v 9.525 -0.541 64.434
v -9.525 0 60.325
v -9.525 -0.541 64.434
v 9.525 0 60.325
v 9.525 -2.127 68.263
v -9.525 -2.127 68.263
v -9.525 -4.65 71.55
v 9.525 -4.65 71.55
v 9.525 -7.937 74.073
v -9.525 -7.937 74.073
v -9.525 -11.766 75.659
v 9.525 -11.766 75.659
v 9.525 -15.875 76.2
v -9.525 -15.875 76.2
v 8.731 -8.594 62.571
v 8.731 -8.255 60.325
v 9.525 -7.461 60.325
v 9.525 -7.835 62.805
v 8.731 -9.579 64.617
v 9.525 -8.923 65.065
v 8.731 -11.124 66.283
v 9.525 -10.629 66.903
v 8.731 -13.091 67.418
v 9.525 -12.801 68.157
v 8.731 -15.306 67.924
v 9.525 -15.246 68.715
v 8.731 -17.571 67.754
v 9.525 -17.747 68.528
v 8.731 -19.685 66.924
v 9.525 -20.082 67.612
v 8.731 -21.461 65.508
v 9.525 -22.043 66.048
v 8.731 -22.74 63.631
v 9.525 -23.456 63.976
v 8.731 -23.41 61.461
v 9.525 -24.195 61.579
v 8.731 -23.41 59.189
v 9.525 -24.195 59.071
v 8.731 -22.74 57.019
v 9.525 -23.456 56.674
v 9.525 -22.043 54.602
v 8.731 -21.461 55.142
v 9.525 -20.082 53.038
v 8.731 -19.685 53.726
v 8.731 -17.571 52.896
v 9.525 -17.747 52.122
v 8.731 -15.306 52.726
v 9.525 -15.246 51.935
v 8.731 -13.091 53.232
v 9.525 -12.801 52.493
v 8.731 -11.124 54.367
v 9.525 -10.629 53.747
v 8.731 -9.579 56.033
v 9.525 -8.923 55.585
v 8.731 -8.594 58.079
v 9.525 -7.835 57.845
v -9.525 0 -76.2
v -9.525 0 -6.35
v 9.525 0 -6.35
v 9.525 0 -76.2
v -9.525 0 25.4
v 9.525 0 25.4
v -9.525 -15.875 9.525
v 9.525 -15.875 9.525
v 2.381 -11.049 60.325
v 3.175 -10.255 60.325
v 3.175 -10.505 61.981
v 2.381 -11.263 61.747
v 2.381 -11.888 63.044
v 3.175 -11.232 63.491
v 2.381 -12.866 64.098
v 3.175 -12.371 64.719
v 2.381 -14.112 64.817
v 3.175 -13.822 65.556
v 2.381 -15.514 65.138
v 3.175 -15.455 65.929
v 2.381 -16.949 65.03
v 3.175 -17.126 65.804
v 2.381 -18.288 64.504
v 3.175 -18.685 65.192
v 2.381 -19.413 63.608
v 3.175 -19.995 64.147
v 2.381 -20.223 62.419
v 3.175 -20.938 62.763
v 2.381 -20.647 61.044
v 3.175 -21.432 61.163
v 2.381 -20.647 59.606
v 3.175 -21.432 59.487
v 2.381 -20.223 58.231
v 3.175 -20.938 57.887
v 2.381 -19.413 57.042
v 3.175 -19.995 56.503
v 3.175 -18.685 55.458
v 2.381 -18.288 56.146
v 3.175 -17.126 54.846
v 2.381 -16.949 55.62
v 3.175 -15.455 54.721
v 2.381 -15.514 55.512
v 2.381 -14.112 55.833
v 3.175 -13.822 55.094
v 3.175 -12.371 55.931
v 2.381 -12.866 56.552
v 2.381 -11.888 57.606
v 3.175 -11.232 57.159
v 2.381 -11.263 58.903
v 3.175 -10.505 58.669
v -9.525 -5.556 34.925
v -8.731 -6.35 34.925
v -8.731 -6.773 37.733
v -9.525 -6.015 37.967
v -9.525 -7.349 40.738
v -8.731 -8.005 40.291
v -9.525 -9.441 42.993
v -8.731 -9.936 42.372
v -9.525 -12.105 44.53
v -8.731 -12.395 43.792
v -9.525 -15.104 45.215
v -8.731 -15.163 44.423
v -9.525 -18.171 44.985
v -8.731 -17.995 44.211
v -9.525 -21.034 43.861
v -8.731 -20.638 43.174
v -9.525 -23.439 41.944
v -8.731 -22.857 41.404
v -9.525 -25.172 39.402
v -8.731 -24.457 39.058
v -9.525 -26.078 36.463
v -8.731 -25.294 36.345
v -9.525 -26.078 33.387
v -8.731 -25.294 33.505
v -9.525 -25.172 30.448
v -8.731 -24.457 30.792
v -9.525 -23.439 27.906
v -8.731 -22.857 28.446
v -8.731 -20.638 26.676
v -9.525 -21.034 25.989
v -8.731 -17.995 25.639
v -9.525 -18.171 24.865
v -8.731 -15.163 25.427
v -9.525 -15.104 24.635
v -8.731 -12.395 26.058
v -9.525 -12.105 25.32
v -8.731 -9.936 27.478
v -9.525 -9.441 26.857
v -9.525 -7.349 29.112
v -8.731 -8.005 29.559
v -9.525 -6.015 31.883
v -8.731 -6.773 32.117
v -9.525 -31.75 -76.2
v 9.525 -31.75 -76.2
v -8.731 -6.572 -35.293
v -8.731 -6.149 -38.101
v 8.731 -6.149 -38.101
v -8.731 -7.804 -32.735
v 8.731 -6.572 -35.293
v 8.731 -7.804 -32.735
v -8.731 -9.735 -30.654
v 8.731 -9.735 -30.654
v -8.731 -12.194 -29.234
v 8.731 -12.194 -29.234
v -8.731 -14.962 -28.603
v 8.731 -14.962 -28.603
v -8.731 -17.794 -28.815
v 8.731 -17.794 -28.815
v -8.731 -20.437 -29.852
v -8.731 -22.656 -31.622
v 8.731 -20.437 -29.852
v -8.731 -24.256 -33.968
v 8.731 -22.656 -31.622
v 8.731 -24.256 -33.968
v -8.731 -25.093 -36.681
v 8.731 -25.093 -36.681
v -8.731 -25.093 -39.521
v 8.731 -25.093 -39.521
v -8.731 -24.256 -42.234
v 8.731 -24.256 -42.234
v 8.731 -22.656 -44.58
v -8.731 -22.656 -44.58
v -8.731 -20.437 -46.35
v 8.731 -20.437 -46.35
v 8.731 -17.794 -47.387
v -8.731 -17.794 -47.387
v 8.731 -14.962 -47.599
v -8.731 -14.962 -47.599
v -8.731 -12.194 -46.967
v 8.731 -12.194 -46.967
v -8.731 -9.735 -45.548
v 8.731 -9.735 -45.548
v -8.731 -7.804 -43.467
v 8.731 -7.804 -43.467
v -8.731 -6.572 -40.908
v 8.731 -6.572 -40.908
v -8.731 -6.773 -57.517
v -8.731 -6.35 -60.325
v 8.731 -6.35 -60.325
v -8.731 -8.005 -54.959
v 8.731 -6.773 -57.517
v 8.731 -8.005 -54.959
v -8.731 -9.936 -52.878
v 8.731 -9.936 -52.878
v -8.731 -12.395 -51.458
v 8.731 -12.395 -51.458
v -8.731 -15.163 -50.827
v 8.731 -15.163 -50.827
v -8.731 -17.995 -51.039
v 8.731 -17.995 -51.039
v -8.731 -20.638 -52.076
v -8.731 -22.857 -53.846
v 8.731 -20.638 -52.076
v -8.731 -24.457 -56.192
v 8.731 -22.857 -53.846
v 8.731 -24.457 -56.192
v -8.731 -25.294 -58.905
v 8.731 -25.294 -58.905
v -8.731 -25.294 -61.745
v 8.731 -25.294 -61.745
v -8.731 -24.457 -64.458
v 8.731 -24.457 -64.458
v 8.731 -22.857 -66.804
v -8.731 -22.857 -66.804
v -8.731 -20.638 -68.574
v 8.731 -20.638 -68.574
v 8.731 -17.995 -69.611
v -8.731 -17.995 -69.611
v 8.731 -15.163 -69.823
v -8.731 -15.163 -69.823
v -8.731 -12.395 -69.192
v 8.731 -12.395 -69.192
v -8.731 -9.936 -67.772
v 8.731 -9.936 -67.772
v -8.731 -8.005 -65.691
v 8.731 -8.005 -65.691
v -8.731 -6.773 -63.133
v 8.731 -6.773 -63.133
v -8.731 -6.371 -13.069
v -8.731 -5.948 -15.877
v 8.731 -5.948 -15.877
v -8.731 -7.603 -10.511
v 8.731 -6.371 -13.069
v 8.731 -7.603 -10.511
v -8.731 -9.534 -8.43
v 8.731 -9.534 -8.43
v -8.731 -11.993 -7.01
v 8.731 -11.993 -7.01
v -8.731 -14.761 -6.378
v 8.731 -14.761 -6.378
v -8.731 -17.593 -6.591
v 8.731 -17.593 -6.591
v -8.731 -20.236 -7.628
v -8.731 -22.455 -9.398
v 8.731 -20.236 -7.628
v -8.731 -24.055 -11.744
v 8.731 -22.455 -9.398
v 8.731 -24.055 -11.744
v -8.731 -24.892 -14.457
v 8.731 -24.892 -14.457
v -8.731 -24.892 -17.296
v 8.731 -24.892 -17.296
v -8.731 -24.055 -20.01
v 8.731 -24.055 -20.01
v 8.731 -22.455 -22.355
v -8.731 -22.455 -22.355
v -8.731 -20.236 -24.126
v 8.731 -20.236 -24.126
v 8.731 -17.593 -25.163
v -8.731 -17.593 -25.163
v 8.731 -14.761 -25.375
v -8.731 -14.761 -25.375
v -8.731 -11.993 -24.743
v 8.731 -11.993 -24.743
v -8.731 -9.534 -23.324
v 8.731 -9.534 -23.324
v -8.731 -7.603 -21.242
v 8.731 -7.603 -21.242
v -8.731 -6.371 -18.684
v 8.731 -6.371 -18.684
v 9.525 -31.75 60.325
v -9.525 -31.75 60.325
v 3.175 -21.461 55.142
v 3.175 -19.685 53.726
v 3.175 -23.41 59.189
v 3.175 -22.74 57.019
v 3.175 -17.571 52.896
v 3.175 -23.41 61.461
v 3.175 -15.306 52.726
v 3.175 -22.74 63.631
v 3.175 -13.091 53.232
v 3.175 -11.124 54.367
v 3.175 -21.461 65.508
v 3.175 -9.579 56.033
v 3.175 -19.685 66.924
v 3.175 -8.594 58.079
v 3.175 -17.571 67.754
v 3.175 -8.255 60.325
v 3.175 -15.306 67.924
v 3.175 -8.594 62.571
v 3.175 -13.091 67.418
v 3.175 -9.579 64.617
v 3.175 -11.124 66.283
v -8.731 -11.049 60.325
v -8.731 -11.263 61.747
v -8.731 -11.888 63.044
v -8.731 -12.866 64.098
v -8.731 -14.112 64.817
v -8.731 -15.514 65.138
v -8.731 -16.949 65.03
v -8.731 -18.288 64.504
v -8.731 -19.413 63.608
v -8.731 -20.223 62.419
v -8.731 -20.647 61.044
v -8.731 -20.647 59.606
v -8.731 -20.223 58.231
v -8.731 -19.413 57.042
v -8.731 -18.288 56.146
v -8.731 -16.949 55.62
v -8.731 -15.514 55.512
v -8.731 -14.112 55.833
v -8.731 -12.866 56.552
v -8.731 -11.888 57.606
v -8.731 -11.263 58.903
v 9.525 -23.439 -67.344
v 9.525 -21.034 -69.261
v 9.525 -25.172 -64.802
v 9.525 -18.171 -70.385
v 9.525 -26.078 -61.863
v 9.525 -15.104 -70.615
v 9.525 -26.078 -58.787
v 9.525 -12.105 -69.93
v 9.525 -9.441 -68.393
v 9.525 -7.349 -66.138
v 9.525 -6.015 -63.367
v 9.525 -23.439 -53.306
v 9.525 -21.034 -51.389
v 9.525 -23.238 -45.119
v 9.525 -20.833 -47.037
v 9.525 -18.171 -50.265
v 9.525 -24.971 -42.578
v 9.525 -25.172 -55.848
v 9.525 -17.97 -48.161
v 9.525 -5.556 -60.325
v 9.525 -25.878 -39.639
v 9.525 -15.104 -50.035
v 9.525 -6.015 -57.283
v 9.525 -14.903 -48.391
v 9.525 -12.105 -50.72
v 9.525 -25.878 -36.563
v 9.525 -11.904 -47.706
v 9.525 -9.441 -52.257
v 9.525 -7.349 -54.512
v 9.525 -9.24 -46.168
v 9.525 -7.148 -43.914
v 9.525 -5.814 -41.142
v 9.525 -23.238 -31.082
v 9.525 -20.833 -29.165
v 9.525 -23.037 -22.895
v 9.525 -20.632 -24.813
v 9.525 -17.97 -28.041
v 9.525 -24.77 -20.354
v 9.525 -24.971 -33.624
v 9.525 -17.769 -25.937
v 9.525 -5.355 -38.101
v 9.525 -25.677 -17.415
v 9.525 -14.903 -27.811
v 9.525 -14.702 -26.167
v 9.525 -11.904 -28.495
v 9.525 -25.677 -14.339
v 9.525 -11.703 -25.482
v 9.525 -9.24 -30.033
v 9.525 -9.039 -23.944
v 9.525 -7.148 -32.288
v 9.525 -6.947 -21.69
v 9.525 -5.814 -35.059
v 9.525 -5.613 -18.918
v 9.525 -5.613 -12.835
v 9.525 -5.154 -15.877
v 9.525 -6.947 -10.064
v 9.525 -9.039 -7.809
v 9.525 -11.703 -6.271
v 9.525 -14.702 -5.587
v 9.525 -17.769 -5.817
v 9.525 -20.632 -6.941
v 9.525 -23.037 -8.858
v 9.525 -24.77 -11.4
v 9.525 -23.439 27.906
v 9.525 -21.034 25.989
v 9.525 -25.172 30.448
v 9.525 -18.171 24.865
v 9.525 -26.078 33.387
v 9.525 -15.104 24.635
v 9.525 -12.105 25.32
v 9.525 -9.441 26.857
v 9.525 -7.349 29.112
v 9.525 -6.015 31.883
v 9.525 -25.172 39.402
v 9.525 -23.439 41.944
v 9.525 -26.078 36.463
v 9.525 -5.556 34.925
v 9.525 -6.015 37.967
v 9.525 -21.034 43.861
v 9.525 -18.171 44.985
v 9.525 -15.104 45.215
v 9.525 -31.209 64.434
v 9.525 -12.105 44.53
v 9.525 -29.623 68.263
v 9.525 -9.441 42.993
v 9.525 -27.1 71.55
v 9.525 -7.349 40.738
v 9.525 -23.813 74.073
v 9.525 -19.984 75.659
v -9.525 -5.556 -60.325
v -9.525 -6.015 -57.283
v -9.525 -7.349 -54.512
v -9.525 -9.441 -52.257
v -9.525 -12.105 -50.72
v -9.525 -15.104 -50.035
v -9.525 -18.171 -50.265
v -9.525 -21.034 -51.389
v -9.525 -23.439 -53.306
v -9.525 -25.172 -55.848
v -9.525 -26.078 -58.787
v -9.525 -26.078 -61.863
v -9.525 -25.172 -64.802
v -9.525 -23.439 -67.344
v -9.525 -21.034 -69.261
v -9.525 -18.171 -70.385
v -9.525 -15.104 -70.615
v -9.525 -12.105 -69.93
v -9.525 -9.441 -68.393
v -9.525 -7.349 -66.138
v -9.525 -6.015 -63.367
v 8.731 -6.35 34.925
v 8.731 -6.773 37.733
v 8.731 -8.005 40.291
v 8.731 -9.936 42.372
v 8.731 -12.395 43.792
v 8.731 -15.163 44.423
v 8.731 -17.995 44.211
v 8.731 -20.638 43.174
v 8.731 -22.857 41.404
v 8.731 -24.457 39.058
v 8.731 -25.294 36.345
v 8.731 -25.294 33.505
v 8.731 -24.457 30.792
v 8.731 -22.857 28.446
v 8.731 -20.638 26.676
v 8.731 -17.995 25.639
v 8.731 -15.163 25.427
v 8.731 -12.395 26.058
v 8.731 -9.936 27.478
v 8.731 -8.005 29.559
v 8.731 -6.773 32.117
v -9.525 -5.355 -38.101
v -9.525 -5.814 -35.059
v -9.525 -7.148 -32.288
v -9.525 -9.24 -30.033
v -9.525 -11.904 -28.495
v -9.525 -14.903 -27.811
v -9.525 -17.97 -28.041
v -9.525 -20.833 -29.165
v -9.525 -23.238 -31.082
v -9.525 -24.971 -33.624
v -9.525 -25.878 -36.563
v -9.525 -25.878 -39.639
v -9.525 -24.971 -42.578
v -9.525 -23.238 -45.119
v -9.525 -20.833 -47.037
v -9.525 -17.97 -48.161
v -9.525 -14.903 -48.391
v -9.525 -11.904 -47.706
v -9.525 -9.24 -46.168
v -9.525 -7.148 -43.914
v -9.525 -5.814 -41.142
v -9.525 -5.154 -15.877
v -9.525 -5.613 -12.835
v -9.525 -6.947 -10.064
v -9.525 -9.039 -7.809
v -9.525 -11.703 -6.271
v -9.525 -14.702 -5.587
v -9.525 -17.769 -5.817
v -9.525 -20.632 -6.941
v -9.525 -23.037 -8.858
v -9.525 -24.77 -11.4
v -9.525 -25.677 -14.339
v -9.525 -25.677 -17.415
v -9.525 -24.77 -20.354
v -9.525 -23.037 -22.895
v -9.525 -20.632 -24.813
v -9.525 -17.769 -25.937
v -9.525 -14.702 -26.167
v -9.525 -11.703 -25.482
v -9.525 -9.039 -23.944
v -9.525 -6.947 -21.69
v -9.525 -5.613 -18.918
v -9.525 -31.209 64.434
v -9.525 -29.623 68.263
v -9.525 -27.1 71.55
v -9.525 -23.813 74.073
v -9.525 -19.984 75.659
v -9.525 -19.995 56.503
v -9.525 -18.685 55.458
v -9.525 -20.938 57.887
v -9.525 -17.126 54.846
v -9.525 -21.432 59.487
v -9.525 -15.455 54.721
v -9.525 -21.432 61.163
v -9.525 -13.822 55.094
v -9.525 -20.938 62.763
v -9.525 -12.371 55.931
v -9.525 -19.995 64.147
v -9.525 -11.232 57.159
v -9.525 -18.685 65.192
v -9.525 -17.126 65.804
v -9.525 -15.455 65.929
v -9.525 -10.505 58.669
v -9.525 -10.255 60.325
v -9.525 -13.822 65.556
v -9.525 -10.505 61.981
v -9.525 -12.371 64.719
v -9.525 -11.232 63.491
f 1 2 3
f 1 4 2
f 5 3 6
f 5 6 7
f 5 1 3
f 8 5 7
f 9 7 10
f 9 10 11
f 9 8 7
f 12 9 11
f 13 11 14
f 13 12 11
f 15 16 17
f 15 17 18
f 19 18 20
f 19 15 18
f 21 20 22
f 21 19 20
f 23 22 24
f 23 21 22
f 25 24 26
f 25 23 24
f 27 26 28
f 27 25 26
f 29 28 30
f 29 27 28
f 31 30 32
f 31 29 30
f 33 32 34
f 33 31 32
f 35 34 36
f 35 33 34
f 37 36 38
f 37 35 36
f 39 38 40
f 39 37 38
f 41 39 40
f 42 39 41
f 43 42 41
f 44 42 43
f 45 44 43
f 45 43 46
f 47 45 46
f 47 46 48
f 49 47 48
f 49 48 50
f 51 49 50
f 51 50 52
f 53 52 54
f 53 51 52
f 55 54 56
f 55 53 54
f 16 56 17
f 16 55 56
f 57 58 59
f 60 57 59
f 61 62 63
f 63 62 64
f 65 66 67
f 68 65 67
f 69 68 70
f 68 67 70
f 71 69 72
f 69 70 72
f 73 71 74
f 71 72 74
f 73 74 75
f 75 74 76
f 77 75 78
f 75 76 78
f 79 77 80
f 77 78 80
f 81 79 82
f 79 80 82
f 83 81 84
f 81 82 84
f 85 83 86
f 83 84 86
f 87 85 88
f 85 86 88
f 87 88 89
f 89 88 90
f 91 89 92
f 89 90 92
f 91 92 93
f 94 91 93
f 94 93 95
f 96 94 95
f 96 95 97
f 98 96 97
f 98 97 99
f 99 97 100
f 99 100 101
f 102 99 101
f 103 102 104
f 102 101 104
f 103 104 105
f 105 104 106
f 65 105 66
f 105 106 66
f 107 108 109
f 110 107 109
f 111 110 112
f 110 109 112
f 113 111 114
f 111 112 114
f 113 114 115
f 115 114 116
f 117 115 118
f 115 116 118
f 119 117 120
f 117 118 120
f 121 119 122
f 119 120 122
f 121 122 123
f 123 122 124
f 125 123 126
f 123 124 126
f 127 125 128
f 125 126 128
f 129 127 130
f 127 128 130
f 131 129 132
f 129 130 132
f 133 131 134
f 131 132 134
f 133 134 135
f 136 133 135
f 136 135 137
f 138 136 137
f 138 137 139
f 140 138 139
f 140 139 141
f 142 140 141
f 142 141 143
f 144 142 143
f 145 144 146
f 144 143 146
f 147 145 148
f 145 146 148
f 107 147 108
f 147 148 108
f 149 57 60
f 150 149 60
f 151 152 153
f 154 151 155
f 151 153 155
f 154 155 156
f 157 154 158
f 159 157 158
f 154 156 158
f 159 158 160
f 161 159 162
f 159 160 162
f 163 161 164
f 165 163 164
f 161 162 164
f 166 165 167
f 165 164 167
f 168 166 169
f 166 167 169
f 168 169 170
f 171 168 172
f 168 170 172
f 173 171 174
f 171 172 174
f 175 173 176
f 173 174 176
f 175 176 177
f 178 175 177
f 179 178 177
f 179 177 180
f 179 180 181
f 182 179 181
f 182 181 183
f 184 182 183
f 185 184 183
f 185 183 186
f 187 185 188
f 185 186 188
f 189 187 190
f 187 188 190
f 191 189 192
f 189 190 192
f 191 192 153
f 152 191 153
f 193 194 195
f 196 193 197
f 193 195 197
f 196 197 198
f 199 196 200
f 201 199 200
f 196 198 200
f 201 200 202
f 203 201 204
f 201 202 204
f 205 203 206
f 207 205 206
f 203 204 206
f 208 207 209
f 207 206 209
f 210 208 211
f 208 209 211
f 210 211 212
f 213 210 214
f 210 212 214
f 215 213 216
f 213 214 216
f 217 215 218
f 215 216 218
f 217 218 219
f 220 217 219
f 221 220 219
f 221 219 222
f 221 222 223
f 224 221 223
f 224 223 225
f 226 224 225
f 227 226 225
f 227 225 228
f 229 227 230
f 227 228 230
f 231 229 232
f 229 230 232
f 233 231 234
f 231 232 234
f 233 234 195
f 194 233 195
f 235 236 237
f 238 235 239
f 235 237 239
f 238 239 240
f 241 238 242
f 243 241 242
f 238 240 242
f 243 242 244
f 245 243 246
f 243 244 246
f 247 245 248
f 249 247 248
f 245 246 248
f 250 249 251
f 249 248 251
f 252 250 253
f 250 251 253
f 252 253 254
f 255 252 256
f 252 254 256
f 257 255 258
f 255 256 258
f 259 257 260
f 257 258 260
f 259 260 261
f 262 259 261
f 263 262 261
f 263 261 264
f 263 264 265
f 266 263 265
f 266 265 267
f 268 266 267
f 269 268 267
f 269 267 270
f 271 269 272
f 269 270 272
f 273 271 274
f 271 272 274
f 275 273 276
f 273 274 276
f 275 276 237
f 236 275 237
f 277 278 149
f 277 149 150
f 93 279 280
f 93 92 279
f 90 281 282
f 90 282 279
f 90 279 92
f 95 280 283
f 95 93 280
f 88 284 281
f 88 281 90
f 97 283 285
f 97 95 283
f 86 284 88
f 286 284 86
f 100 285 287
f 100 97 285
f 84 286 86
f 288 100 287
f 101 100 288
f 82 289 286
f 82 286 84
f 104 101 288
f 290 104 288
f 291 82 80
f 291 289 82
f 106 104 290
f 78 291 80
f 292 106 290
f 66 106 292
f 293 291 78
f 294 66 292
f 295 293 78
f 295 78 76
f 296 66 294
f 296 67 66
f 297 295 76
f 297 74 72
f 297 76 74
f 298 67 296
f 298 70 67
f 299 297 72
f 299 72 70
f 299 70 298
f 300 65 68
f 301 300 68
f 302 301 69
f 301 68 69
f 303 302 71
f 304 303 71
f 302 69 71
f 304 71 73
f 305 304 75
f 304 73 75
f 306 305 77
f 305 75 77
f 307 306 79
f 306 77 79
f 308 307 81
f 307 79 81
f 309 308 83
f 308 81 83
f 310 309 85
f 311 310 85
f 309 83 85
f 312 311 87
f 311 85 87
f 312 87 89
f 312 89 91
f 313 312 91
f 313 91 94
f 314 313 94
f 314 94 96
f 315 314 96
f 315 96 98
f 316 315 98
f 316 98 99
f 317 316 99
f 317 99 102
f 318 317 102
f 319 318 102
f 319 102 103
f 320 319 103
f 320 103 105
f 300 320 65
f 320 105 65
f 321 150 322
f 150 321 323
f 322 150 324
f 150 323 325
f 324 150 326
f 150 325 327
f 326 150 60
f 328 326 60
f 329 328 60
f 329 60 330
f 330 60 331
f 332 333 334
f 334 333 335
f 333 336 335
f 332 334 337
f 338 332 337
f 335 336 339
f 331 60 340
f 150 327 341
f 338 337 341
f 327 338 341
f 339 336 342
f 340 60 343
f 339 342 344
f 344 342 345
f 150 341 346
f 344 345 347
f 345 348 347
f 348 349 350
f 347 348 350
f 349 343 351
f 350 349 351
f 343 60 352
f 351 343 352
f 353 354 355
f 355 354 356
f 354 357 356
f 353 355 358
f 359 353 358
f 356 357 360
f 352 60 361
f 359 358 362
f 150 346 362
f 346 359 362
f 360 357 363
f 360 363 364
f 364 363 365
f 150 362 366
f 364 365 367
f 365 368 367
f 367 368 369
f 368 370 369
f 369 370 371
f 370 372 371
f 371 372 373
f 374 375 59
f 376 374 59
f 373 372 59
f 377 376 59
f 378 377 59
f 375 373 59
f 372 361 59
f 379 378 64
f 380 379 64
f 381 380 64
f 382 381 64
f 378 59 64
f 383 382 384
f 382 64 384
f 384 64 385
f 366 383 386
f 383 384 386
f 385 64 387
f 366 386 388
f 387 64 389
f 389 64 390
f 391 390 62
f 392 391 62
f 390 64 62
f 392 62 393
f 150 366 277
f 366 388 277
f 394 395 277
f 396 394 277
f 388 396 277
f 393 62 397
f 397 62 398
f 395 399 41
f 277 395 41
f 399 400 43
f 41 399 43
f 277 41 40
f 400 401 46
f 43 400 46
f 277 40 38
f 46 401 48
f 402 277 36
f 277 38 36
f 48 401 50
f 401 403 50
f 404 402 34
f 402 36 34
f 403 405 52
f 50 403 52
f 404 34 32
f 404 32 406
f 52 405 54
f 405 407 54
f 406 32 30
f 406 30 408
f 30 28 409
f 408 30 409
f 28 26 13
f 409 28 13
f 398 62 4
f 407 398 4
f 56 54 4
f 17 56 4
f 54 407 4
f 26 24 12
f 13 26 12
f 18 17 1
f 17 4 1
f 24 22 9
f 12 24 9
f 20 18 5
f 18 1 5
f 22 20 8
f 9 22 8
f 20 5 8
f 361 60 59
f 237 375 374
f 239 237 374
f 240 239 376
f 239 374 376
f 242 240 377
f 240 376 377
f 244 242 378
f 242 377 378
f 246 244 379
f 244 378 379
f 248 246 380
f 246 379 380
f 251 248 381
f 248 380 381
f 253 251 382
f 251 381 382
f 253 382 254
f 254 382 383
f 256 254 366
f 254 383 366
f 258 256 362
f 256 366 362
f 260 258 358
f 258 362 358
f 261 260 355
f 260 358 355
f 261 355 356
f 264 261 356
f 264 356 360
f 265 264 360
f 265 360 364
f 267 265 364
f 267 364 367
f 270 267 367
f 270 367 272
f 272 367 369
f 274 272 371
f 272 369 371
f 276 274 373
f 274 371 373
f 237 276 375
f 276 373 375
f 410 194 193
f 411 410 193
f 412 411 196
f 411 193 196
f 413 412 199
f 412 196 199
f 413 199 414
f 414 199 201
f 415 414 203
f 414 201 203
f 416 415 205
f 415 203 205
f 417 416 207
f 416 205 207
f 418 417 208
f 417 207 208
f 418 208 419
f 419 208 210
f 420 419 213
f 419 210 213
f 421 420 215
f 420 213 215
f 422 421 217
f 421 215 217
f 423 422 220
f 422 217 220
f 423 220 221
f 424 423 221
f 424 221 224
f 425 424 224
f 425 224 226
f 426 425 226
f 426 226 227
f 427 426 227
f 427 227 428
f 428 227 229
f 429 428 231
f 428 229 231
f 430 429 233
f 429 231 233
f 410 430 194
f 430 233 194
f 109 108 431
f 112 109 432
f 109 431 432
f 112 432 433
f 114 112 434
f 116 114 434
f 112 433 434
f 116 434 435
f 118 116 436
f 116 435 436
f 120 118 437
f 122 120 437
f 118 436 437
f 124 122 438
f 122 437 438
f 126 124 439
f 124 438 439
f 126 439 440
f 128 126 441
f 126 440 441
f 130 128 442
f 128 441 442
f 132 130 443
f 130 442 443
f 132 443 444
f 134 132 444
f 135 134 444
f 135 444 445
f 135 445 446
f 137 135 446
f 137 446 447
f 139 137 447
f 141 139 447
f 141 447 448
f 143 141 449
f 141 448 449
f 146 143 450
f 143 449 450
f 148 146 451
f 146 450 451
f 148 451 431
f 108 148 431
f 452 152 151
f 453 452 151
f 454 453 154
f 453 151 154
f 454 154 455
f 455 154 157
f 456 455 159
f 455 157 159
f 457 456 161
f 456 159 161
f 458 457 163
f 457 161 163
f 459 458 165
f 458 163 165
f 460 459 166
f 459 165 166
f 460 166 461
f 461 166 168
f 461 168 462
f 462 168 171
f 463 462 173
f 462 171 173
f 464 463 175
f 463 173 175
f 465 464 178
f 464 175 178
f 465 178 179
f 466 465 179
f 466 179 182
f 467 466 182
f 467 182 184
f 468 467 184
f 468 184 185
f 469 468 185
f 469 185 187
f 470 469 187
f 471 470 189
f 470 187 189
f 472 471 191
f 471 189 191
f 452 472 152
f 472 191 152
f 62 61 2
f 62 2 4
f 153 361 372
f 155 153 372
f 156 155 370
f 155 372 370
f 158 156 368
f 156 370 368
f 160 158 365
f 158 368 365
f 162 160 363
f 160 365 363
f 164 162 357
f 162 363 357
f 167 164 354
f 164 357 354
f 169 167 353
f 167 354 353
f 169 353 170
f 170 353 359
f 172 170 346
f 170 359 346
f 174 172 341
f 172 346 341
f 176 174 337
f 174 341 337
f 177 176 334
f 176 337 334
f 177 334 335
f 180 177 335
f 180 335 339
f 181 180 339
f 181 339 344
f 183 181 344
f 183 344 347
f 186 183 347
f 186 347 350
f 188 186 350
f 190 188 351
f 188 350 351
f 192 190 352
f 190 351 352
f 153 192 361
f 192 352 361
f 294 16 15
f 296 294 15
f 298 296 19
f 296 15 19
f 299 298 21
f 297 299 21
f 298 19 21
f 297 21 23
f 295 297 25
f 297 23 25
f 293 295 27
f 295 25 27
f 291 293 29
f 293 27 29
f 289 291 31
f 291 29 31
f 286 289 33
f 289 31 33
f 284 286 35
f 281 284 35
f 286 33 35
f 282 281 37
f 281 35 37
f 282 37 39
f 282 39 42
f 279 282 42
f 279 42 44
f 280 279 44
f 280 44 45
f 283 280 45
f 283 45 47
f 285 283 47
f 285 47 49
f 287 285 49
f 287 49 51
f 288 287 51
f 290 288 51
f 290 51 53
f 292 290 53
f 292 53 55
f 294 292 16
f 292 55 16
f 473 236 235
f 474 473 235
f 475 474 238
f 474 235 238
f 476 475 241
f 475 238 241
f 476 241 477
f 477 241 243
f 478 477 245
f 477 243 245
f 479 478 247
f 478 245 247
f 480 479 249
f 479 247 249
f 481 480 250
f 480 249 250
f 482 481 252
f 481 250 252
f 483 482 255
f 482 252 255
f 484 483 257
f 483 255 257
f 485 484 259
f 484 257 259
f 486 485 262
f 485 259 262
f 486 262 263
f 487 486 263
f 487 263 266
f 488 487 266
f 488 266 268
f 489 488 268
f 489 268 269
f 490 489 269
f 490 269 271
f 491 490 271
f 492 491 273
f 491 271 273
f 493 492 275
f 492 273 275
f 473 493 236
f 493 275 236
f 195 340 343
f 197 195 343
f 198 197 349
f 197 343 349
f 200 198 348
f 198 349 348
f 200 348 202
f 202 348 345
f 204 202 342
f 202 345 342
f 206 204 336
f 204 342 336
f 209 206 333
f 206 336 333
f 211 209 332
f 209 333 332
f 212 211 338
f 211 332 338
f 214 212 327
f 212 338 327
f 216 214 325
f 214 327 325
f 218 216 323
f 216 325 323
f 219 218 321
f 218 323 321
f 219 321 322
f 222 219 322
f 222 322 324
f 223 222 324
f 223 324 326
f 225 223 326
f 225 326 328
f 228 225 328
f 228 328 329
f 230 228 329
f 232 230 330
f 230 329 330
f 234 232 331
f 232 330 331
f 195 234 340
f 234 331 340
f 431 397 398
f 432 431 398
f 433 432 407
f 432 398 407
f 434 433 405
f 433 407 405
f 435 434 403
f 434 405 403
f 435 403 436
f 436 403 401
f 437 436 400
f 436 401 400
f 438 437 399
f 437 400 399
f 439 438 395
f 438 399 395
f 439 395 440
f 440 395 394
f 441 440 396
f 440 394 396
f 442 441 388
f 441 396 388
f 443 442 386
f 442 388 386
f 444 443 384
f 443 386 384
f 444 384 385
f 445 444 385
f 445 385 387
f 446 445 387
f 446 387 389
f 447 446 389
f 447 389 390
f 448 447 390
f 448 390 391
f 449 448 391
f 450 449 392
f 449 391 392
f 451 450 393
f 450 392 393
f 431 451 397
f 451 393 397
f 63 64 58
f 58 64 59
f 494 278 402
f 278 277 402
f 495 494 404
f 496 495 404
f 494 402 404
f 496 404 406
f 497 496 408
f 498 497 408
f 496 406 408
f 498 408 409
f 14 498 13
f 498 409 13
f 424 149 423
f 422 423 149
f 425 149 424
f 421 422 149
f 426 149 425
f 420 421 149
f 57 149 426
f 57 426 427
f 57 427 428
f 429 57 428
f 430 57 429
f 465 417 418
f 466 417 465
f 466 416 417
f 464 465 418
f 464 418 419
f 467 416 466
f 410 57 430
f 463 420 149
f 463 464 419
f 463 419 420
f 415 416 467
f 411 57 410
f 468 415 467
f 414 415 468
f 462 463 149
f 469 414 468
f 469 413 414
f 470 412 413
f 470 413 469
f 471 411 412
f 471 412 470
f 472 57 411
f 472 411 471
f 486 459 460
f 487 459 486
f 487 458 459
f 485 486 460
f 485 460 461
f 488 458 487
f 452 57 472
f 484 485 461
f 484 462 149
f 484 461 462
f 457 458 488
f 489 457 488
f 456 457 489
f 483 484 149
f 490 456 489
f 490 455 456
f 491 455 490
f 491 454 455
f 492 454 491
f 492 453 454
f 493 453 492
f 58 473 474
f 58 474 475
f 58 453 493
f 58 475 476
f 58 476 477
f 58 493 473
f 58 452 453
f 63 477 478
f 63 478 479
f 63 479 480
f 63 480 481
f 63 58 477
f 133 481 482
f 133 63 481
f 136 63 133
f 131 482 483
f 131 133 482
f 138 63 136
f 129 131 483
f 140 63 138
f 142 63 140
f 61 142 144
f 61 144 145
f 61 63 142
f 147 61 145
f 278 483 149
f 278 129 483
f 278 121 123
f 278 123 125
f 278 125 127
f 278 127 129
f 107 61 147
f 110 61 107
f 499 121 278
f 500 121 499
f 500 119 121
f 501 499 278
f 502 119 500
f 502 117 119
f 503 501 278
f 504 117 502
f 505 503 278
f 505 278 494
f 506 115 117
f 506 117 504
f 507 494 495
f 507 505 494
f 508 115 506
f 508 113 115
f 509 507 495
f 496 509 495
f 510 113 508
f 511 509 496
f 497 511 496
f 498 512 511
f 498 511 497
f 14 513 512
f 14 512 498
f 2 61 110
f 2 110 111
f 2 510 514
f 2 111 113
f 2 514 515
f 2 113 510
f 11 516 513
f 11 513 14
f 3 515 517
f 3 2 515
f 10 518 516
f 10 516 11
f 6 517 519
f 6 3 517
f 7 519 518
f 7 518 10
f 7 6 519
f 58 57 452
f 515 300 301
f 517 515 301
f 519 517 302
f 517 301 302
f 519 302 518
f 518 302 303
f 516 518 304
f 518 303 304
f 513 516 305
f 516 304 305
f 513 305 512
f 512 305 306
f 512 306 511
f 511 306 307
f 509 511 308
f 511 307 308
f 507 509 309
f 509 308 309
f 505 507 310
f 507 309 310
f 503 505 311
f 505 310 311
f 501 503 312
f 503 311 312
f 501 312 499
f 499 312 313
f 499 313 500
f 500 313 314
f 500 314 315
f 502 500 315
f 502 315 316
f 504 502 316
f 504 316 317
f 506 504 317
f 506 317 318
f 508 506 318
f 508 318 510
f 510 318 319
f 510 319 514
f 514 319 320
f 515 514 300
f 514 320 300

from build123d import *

# Parameters (mm, degrees)
F0_W     = 19.05
F0_H     = 152.4
F1_DEPTH = 31.75
F8_R     = 7.62
F2_DEPTH = 6.35
F3_R     = 4.826
F9_DEPTH = 12.7
F4_R     = 15.87499
F5_DEPTH = 19.05
F8_R_2   = 9.525
F6_DEPTH = 19.05
F7_SIZE  = 0.79375


# Not quite as in the source:
# - a fillet or chamfer is up to 0.001 mm smaller than in the source, because OpenCascade refuses the exact size


with BuildPart() as f1:
    # F0 (on Front) → F1 (new body)
    with BuildSketch(Plane.XZ):
        Rectangle(F0_W, F0_H)
    extrude(amount=F1_DEPTH)

    # F8 (on face) → F2 (cut)
    with BuildSketch(Plane.YZ.offset(9.525)):
        with Locations((-15.875, 60.325)):
            Circle(F8_R)
    extrude(amount=-F2_DEPTH, mode=Mode.SUBTRACT)

    # F3 (on face) → F9 (cut, through all)
    with BuildSketch(Plane.YZ.offset(3.175)):
        with Locations((-15.875, 60.325)):
            Circle(F3_R)
    extrude(amount=-F9_DEPTH, mode=Mode.SUBTRACT)

    # F4 (radius 15.875 in the source; OpenCascade refuses exactly that, so slightly less here)
    f4_edges = [f1.edges().sort_by_distance(p)[0] for p in [
        (0, -31.75, 76.2),
        (0, 0, 76.2),
    ]]
    fillet(f4_edges, radius=F4_R)

    # F8 (on face) → F5 (cut, through all)
    with BuildSketch(Plane.YZ.offset(9.525)):
        Polygon((0, 25.4), (-15.875, 9.525), (0, -6.35), align=None)
    extrude(amount=-F5_DEPTH, mode=Mode.SUBTRACT)

    # F8 (on face) → F6 (cut, through all)
    with BuildSketch(Plane.YZ.offset(9.525)):
        with Locations((-15.875, 34.925)):
            Circle(F8_R_2)
        with Locations((-15.4730585432, -15.8768173255)):
            Circle(F8_R_2)
        with Locations((-15.6740292716, -38.1009086628)):
            Circle(F8_R_2)
        with Locations((-15.875, -60.325)):
            Circle(F8_R_2)
    extrude(amount=-F6_DEPTH, mode=Mode.SUBTRACT)

    # F7
    f7_edges = [f1.edges().sort_by_distance(p)[0] for p in [
        (0, -6.35, 34.925),
        (9.525, -25.4, 34.925),
        (-9.525, -25.4, 34.925),
        (0, -5.948059, -15.876817),
        (9.525, -24.998059, -15.876817),
        (-9.525, -24.998059, -15.876817),
        (0, -6.149029, -38.100909),
        (9.525, -25.199029, -38.100909),
        (-9.525, -25.199029, -38.100909),
        (0, -6.35, -60.325),
        (9.525, -25.4, -60.325),
        (-9.525, -25.4, -60.325),
        (9.525, -23.495, 60.325),
        (-3.175, -11.049, 60.325),
        (3.175, -20.701, 60.325),
        (-9.525, -20.701, 60.325),
    ]]
    chamfer(f7_edges, length=F7_SIZE)


solid = f1.part
